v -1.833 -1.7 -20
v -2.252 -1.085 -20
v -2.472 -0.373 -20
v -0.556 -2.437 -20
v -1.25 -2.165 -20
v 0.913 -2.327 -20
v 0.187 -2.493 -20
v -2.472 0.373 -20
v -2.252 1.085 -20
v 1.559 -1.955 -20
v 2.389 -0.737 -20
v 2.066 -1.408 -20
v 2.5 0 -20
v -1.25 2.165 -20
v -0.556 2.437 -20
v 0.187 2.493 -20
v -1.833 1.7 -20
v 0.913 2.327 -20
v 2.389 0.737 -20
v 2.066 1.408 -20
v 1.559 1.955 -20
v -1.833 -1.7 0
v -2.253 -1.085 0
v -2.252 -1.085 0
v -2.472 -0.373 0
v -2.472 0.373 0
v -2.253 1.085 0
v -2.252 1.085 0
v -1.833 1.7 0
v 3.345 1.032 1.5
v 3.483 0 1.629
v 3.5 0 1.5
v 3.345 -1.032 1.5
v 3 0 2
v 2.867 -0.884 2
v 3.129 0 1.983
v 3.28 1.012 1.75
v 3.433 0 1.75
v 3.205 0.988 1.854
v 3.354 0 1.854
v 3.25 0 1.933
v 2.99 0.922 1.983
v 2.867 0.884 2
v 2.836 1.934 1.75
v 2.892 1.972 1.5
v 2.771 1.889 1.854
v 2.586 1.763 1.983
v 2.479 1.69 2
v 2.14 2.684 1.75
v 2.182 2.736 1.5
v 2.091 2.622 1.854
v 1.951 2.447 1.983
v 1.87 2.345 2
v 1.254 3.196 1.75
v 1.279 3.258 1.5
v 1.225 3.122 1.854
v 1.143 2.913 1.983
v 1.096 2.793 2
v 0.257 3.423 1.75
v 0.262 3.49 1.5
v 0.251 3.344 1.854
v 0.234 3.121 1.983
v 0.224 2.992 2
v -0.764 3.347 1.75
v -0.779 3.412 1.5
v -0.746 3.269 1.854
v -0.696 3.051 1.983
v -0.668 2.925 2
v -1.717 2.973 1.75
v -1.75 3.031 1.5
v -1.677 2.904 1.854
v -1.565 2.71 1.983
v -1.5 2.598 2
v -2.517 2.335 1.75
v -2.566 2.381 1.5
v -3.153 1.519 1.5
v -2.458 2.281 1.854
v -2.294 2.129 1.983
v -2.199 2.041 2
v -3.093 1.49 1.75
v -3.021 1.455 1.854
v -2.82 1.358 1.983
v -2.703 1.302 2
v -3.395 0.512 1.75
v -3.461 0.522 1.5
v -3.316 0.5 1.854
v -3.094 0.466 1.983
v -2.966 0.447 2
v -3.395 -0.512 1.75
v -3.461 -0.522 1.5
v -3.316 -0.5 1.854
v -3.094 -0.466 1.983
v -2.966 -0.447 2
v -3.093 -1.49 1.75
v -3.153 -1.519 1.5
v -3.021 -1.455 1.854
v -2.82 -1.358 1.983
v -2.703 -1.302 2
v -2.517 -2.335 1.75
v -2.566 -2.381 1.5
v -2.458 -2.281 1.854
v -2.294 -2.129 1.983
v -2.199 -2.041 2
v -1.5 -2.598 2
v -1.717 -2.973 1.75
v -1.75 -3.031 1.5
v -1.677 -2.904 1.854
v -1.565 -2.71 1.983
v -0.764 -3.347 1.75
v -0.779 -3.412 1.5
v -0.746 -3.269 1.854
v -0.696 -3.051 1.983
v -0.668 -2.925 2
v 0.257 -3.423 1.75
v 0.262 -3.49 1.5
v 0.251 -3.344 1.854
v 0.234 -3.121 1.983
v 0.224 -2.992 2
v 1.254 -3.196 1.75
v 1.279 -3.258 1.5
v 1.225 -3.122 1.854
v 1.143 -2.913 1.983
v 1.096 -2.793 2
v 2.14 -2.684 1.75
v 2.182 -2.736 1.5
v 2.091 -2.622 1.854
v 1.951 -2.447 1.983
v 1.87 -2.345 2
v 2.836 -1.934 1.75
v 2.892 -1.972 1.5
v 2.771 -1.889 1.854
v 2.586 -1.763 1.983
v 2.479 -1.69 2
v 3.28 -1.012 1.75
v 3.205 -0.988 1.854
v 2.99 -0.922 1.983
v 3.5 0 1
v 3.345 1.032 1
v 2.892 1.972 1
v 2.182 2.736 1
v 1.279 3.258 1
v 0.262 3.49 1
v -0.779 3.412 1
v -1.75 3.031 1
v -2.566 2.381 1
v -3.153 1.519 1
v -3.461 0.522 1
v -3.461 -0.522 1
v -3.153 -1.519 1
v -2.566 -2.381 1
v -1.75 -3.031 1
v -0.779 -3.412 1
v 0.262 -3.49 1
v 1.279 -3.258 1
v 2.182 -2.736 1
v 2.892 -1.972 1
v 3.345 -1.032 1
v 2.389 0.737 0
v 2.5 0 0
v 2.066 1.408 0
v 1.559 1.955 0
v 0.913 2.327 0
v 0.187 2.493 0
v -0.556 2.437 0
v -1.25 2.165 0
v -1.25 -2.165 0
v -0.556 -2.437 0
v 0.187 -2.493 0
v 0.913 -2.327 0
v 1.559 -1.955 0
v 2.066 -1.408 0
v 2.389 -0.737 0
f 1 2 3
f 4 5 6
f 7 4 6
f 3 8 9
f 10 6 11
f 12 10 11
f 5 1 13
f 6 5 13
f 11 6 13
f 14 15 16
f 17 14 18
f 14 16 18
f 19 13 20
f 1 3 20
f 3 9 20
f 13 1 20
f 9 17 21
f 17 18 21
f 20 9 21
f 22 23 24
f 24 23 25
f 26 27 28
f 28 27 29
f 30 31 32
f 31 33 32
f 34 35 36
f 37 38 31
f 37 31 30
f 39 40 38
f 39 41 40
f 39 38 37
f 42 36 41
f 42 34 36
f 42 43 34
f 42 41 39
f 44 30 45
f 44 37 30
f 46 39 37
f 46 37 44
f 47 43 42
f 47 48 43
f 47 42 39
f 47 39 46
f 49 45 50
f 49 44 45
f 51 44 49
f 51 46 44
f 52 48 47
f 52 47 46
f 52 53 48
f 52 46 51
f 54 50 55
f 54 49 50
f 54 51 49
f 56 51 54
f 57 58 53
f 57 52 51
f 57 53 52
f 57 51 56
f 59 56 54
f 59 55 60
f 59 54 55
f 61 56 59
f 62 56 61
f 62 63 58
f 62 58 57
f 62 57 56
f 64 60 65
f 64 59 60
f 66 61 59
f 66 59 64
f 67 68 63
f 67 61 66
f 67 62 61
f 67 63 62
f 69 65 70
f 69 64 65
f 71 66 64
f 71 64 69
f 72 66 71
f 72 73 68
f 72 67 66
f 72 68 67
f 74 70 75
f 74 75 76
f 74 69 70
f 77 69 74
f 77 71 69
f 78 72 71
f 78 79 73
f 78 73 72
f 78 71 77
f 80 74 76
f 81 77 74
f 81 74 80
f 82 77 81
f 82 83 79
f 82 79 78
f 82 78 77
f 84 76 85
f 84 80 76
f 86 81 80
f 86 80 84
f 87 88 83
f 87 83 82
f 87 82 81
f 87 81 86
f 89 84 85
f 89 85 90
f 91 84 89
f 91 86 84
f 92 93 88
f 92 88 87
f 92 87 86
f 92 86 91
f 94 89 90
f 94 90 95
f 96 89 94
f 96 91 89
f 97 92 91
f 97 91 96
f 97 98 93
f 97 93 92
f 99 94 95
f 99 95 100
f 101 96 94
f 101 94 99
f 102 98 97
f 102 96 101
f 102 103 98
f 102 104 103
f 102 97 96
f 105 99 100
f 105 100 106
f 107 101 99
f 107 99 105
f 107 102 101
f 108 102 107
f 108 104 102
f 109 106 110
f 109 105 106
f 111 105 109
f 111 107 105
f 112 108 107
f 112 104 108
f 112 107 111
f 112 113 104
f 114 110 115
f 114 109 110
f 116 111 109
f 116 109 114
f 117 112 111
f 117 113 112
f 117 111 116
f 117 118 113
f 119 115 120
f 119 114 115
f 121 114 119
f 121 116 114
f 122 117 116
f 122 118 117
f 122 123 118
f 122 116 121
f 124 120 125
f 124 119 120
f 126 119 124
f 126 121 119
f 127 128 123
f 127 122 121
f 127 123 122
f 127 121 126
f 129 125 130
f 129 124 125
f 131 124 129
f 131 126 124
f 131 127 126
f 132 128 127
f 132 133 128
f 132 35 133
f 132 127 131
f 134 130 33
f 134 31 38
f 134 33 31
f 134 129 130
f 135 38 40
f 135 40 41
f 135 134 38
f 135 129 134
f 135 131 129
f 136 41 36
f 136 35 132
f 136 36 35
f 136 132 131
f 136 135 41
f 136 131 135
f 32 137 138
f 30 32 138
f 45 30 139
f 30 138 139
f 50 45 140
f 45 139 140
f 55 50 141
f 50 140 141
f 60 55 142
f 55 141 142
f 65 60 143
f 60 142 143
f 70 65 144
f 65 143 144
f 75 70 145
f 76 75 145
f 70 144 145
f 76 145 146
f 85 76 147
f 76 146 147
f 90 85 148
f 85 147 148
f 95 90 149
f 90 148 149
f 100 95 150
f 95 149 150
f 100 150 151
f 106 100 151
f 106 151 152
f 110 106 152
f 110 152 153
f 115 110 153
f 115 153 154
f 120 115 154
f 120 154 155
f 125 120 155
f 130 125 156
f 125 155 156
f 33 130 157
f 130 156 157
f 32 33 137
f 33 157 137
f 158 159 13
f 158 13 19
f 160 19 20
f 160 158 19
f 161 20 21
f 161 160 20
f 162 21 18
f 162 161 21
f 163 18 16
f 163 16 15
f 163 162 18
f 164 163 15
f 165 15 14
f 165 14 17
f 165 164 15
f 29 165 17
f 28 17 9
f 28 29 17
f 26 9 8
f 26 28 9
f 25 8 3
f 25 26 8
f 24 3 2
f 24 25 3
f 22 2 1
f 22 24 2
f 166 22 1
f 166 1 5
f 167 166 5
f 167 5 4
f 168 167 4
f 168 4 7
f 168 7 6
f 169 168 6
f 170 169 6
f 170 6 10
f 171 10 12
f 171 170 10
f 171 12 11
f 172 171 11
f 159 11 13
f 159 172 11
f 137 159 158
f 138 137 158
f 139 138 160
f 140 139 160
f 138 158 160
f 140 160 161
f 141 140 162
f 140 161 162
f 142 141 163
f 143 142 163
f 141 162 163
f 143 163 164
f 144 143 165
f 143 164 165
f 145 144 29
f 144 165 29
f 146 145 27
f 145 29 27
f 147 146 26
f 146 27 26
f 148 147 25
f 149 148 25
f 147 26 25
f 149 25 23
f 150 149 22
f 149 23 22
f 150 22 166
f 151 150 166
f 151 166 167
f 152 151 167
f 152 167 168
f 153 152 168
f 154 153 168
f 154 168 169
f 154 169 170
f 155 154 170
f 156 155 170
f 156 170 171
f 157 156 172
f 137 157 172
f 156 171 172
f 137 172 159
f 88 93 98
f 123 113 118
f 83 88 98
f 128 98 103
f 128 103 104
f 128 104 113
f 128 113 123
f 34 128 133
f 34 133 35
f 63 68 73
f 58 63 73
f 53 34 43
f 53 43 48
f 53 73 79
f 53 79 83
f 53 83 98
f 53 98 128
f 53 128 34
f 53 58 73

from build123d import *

# Parameters (mm, degrees)
SKETCH1_R           = 2.5
BOSS_EXTRUDE1_DEPTH = 20
SKETCH1_3_R         = 3.5
BOSS_EXTRUDE2_DEPTH = 2
CHAMFER1_SIZE       = 1
FILLET1_R           = 0.5


with BuildPart() as part:
    # Sketch1 → Boss-Extrude1 (new body)
    with BuildSketch(Plane(origin=(0, 0, 0), x_dir=(0, 1, 0), z_dir=(0, 0, 1))):
        with Locations(Location((0, 0, 0), (0, 0, 270))):
            Circle(SKETCH1_R)
    extrude(amount=-BOSS_EXTRUDE1_DEPTH)

    # Sketch1<3> → Boss-Extrude2 (add)
    with BuildSketch(Plane(origin=(0, 0, 0), x_dir=(0, 1, 0), z_dir=(0, 0, 1))):
        with Locations(Location((0, 0, 0), (0, 0, 270))):
            Circle(SKETCH1_3_R)
    extrude(amount=BOSS_EXTRUDE2_DEPTH)

    # Chamfer1
    chamfer1_edges = [part.edges().sort_by_distance(p)[0] for p in [
        (-3.5, 0, 0),
    ]]
    chamfer(chamfer1_edges, length=CHAMFER1_SIZE - 0.0001)  # a hair under: the kernel refuses the full size

    # Fillet1
    fillet1_edges = [part.edges().sort_by_distance(p)[0] for p in [
        (-3.5, 0, 2),
    ]]
    fillet(fillet1_edges, radius=FILLET1_R)


solid = part.part
